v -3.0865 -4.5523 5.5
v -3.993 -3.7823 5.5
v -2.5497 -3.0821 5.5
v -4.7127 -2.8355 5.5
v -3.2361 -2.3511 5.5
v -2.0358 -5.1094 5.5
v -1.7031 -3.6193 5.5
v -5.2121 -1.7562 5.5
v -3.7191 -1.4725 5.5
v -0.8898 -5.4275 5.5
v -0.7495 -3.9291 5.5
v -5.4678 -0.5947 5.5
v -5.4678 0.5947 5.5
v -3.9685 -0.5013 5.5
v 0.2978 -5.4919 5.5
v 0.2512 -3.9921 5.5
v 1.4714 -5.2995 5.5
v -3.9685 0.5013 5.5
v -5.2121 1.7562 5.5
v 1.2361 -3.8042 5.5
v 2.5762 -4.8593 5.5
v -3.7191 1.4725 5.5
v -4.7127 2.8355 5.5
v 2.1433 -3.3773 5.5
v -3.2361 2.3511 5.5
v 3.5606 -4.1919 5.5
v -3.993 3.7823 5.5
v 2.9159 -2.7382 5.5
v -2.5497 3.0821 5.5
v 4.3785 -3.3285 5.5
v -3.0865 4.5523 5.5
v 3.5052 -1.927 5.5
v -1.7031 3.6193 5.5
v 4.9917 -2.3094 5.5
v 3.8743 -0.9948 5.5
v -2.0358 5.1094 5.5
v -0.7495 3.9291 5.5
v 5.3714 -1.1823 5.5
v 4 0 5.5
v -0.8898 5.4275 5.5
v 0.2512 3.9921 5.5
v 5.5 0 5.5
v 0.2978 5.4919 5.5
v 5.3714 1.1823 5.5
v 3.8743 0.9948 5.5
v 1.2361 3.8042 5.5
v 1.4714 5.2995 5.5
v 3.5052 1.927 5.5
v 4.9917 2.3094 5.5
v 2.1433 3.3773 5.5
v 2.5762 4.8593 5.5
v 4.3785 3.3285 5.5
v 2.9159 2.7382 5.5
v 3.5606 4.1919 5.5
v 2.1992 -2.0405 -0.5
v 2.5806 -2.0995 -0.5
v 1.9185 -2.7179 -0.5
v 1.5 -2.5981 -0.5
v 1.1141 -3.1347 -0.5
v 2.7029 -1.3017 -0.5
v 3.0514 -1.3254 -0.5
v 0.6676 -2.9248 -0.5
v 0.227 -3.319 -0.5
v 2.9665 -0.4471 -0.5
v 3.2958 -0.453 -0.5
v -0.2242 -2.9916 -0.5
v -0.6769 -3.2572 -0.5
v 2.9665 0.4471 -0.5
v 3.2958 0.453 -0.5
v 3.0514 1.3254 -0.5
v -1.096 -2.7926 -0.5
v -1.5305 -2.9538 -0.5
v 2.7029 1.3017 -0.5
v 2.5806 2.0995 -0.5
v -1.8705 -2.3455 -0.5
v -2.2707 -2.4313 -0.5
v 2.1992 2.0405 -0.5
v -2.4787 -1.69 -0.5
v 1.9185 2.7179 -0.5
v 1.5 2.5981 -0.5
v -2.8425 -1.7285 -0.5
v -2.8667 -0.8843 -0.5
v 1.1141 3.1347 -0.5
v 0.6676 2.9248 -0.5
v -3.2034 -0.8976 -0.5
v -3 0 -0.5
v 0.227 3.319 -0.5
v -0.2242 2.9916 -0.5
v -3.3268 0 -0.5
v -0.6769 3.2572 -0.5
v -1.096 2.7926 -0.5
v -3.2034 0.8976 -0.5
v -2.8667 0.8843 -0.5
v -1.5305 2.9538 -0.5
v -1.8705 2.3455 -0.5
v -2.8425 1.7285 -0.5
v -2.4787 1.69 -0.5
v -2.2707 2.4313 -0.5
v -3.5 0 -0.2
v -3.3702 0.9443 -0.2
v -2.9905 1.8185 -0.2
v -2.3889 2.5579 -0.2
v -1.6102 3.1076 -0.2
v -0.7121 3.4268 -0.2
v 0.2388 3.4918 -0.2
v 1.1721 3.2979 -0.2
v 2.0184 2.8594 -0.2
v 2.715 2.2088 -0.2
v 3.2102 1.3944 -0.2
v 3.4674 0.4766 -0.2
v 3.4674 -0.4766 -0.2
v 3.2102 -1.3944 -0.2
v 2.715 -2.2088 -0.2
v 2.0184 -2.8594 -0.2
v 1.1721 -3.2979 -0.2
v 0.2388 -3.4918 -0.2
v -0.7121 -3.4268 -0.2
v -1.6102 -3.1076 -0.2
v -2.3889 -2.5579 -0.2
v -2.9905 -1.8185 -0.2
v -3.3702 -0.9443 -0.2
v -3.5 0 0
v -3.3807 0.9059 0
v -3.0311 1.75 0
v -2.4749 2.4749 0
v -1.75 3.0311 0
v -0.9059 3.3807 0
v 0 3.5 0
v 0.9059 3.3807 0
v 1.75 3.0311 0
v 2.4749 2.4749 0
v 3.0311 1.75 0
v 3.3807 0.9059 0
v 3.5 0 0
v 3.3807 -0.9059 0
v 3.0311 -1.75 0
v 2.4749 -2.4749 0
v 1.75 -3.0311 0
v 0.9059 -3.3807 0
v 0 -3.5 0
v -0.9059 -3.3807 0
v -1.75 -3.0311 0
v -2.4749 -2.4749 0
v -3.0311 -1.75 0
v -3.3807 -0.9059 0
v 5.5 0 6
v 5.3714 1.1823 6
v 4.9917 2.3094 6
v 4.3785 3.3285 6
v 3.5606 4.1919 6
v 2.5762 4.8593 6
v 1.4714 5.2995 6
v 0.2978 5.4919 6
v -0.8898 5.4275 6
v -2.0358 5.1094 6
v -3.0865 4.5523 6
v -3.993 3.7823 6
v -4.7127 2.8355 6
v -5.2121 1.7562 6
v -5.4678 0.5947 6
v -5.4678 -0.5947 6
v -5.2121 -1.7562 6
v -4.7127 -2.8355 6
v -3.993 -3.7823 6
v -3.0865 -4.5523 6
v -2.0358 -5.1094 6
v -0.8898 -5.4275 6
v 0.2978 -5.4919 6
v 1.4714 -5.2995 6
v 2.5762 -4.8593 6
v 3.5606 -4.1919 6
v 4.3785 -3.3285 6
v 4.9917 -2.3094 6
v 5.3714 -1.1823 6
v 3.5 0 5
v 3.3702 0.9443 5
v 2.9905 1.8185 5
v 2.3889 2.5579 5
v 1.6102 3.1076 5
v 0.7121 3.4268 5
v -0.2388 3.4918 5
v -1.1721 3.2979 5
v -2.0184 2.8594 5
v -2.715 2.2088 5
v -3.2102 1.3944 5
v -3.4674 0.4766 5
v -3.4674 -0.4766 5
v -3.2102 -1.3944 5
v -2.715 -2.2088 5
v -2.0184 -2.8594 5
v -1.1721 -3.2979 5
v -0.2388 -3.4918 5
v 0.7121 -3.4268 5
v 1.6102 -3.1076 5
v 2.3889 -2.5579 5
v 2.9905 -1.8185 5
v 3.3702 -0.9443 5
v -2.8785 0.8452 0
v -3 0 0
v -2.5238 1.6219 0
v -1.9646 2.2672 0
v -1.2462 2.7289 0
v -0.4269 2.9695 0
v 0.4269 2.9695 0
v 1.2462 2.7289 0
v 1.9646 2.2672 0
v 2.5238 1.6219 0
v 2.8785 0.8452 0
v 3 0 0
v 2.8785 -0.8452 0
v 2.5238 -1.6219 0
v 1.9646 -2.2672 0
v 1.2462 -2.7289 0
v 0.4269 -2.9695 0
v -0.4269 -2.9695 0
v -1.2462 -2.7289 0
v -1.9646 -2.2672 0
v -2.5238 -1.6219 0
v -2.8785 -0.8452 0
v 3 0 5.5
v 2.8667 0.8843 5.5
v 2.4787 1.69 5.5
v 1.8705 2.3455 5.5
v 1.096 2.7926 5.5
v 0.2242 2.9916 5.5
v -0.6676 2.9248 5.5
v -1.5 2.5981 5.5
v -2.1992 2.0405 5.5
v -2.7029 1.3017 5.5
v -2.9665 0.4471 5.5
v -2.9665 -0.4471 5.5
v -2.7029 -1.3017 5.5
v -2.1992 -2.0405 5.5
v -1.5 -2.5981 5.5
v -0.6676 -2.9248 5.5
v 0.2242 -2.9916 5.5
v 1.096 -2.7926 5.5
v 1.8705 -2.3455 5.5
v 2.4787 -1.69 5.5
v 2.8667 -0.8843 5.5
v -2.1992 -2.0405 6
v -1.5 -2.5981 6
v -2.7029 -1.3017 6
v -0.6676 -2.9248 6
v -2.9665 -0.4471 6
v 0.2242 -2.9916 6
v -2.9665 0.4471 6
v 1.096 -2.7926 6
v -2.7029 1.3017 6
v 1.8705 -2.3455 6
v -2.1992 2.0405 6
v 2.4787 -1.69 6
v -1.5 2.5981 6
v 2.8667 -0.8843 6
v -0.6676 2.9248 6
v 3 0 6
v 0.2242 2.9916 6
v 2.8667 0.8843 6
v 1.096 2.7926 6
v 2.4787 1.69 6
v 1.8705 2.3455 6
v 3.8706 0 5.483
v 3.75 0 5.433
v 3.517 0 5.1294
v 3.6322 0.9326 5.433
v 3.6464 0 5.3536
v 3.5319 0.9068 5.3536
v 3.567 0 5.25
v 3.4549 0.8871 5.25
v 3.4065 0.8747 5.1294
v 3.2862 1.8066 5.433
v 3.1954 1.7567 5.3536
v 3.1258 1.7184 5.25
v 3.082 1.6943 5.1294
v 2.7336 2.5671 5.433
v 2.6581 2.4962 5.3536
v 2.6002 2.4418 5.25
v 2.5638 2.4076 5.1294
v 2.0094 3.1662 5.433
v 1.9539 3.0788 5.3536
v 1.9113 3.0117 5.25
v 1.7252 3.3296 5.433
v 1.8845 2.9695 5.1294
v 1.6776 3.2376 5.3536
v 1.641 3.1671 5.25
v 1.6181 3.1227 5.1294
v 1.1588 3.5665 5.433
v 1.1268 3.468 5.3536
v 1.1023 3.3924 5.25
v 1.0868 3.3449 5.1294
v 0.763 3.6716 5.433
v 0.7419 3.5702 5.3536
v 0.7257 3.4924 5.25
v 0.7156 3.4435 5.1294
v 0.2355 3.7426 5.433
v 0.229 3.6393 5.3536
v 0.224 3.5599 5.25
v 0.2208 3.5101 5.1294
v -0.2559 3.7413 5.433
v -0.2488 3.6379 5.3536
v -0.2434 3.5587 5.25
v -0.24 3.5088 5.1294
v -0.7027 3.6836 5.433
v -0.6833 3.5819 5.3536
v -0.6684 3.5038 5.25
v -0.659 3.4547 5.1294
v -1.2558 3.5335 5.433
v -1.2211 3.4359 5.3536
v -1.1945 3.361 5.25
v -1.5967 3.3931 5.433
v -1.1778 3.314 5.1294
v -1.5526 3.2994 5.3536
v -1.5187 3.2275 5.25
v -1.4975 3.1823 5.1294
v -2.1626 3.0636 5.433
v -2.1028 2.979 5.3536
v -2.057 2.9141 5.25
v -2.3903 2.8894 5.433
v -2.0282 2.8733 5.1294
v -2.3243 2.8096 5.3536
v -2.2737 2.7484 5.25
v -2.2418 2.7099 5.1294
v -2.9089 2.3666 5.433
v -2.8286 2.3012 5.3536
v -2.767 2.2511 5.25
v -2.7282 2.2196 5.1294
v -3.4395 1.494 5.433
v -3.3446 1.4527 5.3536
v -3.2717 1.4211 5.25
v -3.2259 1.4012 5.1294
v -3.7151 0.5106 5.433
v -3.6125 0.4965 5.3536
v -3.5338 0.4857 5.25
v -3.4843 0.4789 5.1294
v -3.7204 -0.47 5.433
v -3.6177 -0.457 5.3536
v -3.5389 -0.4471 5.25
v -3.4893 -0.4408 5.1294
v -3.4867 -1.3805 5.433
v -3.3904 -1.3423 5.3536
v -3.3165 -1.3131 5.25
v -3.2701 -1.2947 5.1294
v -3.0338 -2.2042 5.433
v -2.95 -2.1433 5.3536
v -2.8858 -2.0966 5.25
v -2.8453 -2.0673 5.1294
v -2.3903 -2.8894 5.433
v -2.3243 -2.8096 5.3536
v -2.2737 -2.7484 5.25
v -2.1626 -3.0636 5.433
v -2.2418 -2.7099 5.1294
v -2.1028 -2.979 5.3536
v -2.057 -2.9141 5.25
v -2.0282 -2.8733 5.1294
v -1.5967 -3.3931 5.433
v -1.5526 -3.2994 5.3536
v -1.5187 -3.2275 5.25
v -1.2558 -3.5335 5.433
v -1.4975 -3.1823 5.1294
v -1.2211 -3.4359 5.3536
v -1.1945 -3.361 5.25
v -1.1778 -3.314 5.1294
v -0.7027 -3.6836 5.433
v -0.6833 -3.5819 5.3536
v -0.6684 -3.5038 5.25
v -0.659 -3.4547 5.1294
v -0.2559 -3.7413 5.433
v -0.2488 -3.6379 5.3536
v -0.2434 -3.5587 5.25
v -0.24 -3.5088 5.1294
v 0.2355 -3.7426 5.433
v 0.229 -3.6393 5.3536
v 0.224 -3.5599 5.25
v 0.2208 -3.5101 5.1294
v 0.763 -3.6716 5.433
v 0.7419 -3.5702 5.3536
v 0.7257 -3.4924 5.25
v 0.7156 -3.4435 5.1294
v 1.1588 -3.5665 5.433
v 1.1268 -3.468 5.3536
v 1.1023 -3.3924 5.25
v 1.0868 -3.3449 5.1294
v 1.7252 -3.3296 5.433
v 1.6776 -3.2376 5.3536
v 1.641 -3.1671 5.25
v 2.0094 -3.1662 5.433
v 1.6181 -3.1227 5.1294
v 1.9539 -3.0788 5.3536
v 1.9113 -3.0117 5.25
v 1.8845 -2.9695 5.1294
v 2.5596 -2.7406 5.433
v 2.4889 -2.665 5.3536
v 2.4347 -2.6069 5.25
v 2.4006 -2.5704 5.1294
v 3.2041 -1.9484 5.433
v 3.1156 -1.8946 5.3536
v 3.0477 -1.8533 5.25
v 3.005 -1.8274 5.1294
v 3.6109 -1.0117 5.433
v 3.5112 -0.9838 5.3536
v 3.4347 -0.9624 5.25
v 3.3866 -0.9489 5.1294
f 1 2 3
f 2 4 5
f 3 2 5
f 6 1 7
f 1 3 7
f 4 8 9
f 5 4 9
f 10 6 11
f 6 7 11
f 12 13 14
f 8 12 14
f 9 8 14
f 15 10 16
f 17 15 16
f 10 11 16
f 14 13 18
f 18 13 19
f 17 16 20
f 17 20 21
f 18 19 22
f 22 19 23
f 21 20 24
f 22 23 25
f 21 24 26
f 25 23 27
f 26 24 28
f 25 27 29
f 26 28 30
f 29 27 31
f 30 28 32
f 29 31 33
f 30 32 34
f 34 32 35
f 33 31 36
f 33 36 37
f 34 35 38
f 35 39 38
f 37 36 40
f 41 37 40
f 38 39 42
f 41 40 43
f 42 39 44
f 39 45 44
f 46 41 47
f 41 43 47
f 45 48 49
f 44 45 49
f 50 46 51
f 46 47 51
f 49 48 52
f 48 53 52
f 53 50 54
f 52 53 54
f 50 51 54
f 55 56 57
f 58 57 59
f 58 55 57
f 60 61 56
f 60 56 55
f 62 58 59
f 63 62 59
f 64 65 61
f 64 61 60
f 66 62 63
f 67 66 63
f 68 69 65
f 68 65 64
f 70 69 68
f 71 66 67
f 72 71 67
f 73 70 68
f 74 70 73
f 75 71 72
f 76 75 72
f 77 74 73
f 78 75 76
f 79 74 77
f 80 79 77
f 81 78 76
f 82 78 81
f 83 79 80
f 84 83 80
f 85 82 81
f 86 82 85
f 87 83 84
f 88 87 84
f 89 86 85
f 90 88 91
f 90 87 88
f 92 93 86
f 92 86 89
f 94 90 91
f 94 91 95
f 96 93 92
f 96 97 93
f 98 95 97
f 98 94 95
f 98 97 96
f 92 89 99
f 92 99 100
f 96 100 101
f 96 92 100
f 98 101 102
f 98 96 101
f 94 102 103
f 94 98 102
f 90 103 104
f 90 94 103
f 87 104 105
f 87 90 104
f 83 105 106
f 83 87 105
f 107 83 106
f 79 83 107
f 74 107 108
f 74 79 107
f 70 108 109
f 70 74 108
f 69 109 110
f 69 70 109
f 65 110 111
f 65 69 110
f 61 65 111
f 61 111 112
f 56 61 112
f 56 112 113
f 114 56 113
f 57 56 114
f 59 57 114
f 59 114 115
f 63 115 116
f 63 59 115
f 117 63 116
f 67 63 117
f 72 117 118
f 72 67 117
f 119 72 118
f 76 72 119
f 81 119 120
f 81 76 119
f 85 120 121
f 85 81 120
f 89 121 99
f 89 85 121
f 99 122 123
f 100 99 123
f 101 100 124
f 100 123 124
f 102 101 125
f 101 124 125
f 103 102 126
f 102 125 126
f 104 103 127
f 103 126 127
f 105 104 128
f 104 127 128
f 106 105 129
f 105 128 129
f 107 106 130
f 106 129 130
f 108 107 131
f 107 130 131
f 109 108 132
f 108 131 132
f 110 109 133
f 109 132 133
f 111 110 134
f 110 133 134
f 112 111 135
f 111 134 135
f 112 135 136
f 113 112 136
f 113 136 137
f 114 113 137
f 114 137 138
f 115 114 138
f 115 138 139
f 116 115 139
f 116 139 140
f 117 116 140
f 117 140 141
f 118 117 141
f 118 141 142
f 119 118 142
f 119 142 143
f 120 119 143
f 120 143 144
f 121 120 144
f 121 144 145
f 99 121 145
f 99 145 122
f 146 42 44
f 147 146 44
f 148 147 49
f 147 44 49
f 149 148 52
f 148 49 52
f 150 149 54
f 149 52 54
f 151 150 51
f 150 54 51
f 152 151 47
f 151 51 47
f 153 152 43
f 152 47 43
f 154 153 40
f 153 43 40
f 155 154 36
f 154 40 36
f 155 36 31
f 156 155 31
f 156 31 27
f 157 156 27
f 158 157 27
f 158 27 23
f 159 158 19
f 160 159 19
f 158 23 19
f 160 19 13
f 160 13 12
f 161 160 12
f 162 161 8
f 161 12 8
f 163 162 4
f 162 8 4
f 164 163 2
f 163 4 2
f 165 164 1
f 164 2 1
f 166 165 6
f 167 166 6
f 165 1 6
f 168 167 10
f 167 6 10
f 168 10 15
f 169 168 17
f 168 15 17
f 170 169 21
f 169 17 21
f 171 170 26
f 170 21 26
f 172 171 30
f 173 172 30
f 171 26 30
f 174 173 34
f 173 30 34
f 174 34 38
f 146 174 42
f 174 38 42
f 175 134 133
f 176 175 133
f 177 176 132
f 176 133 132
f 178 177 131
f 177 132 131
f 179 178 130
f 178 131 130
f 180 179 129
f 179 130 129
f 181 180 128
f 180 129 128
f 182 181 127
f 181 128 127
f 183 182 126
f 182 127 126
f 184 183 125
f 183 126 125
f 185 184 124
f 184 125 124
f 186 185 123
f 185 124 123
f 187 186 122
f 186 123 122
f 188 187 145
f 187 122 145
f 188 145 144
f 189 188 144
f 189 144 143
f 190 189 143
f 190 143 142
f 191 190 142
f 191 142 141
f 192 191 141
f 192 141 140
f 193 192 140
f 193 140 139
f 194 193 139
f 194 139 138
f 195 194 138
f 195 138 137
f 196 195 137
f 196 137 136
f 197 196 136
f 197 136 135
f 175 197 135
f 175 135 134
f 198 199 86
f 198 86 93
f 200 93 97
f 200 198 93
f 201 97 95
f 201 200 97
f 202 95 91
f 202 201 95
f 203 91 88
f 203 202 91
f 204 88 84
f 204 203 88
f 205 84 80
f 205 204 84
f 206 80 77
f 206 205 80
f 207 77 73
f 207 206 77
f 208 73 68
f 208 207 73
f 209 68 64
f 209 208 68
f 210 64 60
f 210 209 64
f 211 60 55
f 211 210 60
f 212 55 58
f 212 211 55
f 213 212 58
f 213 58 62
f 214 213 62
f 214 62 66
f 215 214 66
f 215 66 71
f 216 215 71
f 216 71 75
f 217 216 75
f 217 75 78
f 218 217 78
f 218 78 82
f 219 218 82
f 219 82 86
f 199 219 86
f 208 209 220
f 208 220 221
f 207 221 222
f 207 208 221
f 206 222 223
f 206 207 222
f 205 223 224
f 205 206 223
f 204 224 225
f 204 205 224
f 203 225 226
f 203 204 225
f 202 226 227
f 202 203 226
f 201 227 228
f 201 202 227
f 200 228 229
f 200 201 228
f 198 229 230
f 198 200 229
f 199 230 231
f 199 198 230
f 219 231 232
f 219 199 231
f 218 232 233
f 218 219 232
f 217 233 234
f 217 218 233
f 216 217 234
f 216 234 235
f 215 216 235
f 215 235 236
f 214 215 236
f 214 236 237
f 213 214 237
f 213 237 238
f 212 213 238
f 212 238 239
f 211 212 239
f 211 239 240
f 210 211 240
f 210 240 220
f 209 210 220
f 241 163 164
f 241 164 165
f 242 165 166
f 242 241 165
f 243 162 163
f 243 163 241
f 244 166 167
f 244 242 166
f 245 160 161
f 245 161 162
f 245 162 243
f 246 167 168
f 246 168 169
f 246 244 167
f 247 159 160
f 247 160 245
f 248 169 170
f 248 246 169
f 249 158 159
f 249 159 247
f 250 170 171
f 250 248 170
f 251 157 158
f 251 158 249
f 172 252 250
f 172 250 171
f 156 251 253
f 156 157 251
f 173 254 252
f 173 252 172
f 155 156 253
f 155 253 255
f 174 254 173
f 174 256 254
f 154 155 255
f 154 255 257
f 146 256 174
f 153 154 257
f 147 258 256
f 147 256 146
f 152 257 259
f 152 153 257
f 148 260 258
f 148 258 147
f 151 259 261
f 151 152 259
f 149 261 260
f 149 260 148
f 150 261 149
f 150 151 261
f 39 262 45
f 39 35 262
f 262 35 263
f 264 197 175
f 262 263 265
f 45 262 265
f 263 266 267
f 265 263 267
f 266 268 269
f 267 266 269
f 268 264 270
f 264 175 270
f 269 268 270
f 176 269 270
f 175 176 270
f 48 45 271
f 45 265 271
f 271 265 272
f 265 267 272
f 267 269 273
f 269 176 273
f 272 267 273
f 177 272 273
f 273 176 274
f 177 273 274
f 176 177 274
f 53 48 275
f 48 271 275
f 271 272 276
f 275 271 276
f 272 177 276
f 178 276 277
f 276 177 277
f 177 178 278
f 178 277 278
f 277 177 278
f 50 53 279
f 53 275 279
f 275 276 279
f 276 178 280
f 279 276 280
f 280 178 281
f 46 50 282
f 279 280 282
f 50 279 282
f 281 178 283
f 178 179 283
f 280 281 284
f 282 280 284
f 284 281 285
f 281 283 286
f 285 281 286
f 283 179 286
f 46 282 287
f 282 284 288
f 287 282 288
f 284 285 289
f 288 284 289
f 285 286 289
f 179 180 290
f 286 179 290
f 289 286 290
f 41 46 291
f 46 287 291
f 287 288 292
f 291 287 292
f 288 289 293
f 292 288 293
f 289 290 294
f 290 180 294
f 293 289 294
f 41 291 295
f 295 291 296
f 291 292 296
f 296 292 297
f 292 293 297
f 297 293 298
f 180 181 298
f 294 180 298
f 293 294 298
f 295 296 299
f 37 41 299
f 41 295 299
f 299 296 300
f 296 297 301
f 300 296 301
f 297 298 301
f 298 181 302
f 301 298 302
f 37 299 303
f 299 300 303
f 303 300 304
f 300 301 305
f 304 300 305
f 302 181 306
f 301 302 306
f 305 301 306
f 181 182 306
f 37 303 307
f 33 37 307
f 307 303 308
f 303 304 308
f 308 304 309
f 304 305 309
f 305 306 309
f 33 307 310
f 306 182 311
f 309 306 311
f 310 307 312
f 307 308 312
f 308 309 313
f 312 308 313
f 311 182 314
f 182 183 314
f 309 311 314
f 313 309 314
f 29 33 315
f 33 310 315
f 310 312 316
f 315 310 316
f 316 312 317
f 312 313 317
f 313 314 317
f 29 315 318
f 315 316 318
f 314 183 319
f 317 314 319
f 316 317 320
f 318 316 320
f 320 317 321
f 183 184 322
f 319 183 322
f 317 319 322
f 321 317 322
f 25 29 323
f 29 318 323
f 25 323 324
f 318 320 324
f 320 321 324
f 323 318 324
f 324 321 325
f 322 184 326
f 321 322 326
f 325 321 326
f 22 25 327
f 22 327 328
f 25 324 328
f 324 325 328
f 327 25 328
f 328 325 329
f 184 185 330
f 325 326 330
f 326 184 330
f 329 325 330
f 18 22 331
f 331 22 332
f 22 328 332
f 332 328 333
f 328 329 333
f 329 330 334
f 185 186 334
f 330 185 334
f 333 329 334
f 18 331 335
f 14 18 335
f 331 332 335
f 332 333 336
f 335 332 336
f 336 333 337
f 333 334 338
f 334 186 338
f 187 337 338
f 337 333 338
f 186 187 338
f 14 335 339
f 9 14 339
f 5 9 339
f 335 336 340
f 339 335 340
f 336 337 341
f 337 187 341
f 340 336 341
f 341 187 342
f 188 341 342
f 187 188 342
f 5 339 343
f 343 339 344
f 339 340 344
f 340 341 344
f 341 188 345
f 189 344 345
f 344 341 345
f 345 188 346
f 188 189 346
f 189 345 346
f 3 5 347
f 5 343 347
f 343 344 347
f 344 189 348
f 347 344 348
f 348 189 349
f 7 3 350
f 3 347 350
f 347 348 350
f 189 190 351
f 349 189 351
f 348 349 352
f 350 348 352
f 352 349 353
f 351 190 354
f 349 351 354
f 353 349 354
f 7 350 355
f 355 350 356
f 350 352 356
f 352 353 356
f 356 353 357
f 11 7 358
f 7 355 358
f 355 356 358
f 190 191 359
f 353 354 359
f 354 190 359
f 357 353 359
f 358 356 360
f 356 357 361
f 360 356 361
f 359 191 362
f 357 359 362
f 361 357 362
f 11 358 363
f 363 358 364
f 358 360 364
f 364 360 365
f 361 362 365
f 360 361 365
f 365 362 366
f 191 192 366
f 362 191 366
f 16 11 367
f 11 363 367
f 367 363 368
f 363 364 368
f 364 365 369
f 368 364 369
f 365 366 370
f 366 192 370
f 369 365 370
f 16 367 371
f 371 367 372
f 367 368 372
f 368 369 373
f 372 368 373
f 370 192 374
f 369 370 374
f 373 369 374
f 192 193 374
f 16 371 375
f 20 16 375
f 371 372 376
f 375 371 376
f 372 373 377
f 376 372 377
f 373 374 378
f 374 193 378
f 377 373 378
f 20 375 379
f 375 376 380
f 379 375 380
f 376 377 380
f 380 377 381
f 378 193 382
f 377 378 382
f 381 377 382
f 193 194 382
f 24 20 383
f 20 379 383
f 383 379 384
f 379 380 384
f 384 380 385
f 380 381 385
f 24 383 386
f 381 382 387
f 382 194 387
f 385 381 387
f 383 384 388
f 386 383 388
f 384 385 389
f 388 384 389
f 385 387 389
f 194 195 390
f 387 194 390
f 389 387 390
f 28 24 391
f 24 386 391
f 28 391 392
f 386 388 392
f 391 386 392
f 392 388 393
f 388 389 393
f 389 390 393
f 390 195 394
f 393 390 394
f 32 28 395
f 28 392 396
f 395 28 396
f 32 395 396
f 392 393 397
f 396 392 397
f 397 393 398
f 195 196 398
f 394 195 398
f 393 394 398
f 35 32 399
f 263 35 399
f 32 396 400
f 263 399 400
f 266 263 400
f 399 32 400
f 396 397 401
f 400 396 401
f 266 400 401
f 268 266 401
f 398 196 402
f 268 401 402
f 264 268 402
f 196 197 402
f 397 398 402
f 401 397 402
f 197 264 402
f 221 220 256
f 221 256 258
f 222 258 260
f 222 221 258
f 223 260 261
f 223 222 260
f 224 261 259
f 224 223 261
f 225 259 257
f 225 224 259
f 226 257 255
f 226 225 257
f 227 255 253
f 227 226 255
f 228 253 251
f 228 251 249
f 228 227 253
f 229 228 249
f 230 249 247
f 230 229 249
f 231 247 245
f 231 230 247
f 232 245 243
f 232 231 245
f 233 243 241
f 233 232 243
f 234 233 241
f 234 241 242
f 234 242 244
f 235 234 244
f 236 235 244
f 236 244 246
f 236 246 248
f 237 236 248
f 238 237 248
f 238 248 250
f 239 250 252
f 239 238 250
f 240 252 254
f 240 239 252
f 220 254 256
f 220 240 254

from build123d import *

# Parameters (mm, degrees)
ESBO_O1_R                = 3.5
ESBO_O1_R_2              = 3
RESSALTO_EXTRUS_O1_DEPTH = 5.5
ESBO_O2_R                = 3.5
ESBO_O2_R_2              = 3
RESSALTO_EXTRUS_O2_DEPTH = 0.5
ESBO_O3_R                = 5.5
ESBO_O3_R_2              = 3
RESSALTO_EXTRUS_O4_DEPTH = 0.5
FILETE1_R                = 0.5
CHANFRO1_SIZE            = 0.3
CHANFRO1_SIZE2           = 0.173205081


with BuildPart() as part:
    # Esboço1 → Ressalto-extrusão1 (new body)
    with BuildSketch(Plane.XY):
        Circle(ESBO_O1_R)
        Circle(ESBO_O1_R_2, mode=Mode.SUBTRACT)
    extrude(amount=RESSALTO_EXTRUS_O1_DEPTH)

    # Esboço2 → Ressalto-extrusão2 (add)
    with BuildSketch(Plane(origin=(0, 0, 0), x_dir=(-1, 0, 0), z_dir=(0, 0, -1))):
        Circle(ESBO_O2_R)
        Circle(ESBO_O2_R_2, mode=Mode.SUBTRACT)
    extrude(amount=RESSALTO_EXTRUS_O2_DEPTH)

    # Esboço3 → Ressalto-extrusão4 (add)
    with BuildSketch(Plane.XY.offset(5.5)):
        Circle(ESBO_O3_R)
        Circle(ESBO_O3_R_2, mode=Mode.SUBTRACT)
    extrude(amount=RESSALTO_EXTRUS_O4_DEPTH)

    # Filete1
    filete1_edges = [part.edges().sort_by_distance(p)[0] for p in [
        (-3.5, 0, 5.5),
    ]]
    fillet(filete1_edges, radius=FILETE1_R)

    # Chanfro1
    chanfro1_edges = [part.edges().sort_by_distance(p)[0] for p in [
        (3.5, 0, -0.5),
    ]]
    chanfro1_side = [part.faces().sort_by_distance(p)[0] for p in [
        (3.5, 0, -0.25),
    ]]
    chamfer(chanfro1_edges, length=CHANFRO1_SIZE, length2=CHANFRO1_SIZE2, reference=chanfro1_side[0])


solid = part.part
